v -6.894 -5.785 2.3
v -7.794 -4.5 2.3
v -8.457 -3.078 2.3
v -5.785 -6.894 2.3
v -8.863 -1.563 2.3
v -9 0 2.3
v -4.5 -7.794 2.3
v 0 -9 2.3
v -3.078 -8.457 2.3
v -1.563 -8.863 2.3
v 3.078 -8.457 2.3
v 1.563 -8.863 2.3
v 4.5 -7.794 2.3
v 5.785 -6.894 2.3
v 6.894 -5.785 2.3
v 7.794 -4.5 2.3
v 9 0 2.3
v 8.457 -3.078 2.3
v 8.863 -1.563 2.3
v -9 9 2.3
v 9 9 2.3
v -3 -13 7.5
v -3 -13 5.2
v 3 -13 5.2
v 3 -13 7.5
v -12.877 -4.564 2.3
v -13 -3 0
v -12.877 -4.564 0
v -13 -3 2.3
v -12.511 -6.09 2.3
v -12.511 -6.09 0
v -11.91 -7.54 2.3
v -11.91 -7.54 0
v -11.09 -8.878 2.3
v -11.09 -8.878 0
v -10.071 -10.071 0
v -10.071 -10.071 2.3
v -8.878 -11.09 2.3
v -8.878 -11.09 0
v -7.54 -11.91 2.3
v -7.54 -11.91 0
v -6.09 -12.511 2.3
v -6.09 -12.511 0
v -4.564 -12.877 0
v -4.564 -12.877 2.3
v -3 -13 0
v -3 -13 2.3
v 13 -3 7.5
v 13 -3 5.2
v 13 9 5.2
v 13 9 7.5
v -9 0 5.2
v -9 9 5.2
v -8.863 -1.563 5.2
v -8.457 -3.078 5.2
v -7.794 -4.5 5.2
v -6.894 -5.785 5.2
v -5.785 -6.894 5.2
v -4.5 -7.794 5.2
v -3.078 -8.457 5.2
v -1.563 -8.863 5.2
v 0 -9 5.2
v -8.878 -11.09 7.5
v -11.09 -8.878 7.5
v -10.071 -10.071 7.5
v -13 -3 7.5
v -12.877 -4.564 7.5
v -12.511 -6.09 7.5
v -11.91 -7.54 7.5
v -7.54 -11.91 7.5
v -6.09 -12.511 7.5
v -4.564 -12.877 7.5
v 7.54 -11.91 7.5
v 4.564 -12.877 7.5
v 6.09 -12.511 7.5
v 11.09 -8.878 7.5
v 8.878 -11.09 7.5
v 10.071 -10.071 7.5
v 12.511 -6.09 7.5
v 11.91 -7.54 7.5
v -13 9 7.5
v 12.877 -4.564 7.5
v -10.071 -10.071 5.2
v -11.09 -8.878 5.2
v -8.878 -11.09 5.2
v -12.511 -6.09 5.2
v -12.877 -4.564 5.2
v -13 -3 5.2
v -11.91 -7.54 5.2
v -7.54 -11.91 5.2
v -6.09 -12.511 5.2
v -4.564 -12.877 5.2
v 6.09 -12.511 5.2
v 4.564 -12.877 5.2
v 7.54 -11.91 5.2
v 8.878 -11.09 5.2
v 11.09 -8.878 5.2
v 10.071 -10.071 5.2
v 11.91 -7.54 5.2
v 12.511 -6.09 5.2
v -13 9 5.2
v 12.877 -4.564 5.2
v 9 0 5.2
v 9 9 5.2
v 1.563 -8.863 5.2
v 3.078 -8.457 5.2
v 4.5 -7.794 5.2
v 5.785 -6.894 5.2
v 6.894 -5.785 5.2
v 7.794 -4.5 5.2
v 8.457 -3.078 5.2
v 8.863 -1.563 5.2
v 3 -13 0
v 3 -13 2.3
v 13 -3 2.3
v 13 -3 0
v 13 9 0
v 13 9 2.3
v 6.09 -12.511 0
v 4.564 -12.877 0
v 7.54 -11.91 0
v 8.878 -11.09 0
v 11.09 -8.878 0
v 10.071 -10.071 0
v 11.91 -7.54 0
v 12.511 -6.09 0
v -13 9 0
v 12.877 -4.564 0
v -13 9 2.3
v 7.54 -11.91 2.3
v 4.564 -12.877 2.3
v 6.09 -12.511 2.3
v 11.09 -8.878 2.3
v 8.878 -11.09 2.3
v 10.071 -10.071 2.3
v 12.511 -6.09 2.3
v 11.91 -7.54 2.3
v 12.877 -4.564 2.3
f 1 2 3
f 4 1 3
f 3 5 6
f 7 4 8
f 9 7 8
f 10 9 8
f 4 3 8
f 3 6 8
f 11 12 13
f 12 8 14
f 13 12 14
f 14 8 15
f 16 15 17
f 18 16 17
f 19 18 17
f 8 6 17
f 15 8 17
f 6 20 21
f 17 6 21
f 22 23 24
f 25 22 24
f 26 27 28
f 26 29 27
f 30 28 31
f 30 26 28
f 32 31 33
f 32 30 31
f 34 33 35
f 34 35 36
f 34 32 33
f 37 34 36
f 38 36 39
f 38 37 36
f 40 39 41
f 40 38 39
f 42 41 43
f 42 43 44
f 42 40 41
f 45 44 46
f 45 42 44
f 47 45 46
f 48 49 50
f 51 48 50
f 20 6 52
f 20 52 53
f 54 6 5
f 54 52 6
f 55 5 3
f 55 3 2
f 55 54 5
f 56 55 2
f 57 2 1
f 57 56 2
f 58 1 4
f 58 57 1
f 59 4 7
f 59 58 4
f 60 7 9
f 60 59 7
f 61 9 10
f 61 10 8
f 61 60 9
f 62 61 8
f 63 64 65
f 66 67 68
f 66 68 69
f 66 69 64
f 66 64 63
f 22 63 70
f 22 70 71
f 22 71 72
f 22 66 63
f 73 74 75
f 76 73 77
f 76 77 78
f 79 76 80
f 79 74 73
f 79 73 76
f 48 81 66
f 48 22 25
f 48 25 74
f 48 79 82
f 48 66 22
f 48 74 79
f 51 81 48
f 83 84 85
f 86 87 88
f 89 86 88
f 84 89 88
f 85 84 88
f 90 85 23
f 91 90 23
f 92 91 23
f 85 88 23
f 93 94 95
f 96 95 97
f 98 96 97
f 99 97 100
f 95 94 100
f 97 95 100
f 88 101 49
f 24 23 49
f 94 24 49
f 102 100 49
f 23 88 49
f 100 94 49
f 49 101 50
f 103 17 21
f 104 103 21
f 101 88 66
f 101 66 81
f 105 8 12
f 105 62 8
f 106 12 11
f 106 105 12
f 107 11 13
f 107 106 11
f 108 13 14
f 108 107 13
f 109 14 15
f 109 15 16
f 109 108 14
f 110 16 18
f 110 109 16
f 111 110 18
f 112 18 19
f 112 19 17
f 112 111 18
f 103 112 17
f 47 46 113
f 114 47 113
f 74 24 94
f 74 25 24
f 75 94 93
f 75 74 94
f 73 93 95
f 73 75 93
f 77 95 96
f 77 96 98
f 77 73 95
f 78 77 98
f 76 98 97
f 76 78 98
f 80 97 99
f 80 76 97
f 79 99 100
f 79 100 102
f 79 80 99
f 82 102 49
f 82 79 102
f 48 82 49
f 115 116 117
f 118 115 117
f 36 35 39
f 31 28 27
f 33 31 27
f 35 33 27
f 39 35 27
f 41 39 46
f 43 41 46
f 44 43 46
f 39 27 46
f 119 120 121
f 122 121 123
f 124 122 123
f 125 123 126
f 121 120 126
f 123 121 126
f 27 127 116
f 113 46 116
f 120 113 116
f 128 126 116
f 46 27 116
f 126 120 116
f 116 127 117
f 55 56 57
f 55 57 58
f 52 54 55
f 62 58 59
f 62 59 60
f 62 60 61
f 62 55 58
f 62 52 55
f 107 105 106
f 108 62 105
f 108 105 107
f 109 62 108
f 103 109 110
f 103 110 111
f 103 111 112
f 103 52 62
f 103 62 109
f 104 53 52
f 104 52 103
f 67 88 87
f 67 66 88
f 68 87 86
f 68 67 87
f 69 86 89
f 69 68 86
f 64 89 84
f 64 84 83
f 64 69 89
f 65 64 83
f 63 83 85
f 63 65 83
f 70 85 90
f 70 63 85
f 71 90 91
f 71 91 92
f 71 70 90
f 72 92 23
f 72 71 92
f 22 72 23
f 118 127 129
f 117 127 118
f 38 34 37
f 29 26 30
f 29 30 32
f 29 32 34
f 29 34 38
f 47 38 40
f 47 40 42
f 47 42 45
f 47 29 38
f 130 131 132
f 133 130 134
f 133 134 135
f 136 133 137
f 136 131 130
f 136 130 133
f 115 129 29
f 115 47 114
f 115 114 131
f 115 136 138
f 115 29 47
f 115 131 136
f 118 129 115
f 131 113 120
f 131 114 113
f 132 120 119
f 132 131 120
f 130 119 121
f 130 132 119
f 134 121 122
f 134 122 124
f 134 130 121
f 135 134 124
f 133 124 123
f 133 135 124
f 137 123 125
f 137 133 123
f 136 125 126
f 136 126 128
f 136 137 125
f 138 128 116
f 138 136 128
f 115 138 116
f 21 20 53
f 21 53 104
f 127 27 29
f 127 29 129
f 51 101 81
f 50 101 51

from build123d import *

# Parameters (mm, degrees)
F1_W     = 26
F1_H     = 22
F2_DEPTH = 2.3
F3_START = 5.2
F3_DEPTH = 2.3
F4_START = 2.3
F0_W     = 18
F0_H     = 18
F4_DEPTH = 2.9
F5_R     = 8.99999
F6_R     = 10
F6_2_R   = 10


# Not quite as in the source:
# - a fillet or chamfer is up to 0.001 mm smaller than in the source, because OpenCascade refuses the exact size


with BuildPart() as f2:
    # F1 (on Top) → F2 (new body)
    with BuildSketch(Plane.XY):
        with Locations((0, -2)):
            Rectangle(F1_W, F1_H)
    extrude(amount=F2_DEPTH)

    # F6#2
    f6_2_edges = [f2.edges().sort_by_distance(p)[0] for p in [
        (13, -13, 1.15),
        (-13, -13, 1.15),
    ]]
    fillet(f6_2_edges, radius=F6_2_R)


with BuildPart() as f3:
    # F1 (on Top) → F3 (new body)
    with BuildSketch(Plane.XY.offset(F3_START)):
        with Locations((0, -2)):
            Rectangle(F1_W, F1_H)
    extrude(amount=F3_DEPTH)

    # F6
    f6_edges = [f3.edges().sort_by_distance(p)[0] for p in [
        (-13, -13, 6.35),
        (13, -13, 6.35),
    ]]
    fillet(f6_edges, radius=F6_R)


with BuildPart() as f4:
    # F0 (on Top) → F4 (new body)
    with BuildSketch(Plane.XY.offset(F4_START)):
        Rectangle(F0_W, F0_H)
    extrude(amount=F4_DEPTH)

    # F5 (radius 9 in the source; OpenCascade refuses exactly that, so slightly less here)
    f5_edges = [f4.edges().sort_by_distance(p)[0] for p in [
        (-9, -9, 3.75),
        (9, -9, 3.75),
    ]]
    fillet(f5_edges, radius=F5_R)


solid = Compound([f2.part, f3.part, f4.part])
